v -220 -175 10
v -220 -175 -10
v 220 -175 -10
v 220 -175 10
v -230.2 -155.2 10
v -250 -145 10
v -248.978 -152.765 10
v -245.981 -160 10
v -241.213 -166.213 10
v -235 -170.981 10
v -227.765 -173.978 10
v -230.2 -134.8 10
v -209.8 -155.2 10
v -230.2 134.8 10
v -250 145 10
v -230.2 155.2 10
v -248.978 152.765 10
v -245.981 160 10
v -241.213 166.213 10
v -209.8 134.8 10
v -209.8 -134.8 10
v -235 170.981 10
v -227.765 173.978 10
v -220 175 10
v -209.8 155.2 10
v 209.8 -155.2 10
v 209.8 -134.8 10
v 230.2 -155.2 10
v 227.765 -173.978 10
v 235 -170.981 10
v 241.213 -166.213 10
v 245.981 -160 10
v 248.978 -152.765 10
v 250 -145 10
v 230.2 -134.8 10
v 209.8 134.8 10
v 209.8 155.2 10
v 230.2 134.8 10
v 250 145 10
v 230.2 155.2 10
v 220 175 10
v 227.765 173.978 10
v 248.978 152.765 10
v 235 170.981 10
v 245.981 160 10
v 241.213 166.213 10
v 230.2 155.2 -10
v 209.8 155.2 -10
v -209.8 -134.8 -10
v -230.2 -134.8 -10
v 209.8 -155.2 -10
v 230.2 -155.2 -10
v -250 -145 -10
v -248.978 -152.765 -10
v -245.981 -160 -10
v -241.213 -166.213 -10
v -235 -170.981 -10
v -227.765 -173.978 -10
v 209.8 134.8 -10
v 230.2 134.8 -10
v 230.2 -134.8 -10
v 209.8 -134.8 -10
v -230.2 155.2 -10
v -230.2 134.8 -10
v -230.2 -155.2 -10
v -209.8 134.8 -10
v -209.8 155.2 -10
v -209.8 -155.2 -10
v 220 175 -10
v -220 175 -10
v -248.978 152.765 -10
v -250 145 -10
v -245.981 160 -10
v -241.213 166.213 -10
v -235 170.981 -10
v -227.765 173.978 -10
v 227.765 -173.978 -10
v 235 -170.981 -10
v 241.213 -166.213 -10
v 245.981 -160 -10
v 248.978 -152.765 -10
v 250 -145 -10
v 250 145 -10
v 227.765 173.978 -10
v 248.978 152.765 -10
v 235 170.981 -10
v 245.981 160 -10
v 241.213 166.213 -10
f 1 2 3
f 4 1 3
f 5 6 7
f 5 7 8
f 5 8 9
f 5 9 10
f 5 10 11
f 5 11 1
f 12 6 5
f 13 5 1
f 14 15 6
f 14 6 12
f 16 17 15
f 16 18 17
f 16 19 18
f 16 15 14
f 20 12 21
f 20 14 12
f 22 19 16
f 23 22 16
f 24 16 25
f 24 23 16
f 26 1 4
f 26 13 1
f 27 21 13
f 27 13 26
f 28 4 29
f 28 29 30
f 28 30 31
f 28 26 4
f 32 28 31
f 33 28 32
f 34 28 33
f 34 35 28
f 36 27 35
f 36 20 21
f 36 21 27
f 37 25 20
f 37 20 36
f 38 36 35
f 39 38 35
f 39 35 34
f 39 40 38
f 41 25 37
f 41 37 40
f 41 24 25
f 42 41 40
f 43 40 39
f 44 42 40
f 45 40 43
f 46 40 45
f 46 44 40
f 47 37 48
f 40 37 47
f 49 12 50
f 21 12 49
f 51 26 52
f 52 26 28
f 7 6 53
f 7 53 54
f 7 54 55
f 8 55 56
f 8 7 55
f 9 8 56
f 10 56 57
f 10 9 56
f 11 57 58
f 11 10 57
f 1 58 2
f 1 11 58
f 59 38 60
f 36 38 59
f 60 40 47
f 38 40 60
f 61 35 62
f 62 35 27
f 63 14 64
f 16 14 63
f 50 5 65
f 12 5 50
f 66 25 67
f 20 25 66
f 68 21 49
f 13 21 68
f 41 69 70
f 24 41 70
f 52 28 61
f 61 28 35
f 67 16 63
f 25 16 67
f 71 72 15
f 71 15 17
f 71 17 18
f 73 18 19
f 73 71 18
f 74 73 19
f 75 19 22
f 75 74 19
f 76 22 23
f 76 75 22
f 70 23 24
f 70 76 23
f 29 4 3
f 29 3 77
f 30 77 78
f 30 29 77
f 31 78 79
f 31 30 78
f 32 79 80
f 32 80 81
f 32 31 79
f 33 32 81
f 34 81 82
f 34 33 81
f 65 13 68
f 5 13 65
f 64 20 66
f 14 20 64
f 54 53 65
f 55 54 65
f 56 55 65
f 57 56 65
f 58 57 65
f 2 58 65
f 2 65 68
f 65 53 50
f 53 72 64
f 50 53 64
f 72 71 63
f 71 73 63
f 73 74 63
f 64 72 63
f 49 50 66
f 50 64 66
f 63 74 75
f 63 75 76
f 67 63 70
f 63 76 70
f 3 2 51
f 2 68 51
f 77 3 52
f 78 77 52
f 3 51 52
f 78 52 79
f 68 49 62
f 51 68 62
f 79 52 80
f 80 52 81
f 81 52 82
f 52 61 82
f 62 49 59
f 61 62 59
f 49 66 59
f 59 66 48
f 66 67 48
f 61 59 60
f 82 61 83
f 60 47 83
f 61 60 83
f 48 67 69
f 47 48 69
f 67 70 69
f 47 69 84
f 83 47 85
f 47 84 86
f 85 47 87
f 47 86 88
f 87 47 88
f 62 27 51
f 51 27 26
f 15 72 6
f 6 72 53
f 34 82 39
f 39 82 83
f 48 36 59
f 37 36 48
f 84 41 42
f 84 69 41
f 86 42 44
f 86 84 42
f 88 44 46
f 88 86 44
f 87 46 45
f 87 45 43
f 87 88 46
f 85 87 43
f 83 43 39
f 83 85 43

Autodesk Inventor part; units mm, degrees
sketch "Esboço1" plane through (0, 0, 0) normal (0, 0, 1) x (1, 0, 0)
  line L0 (-250, -175) -> (250, -175)
  line L1 (250, -175) -> (250, 175)
  line L2 (250, 175) -> (-250, 175)
  line L3 (-250, 175) -> (-250, -175)
  line L4 (-250, -175) -> (250, 175) construction
  line L5 (250, -175) -> (-250, 175) construction
  point P0 (0, 0)
  dimension "d0" = 500
  dimension "d1" = 350
extrude "Extrusão1" add sketch "Esboço1" along normal mid plane 20
fillet "Arredondamento1" radius 30 4 edges at (-250, 175, 0) (250, 175, 0) (250, -175, 0) (-250, -175, 0)
sketch "Esboço2" plane through (0, 0, 10) normal (0, 0, 1) x (1, 0, 0)
  line L0 (230, 135) -> (230, 155) projected
  line L1 (230, 155) -> (210, 155) projected
  line L2 (210, 155) -> (210, 135) projected
  line L3 (210, 135) -> (230, 135) projected
  line L4 (212, 137) -> (212, 153) projected
  line L5 (212, 153) -> (228, 153) projected
  line L6 (228, 153) -> (228, 137) projected
  line L7 (228, 137) -> (212, 137) projected
  line L8 (209.8, 155.2) -> (230.2, 155.2)
  line L9 (230.2, 155.2) -> (230.2, 134.8)
  line L10 (230.2, 134.8) -> (209.8, 134.8)
  line L11 (209.8, 134.8) -> (209.8, 155.2)
  line L12 (-210, 135) -> (-210, 155) projected
  line L13 (-210, 155) -> (-230, 155) projected
  line L14 (-230, 155) -> (-230, 135) projected
  line L15 (-230, 135) -> (-210, 135) projected
  line L16 (-228, 137) -> (-228, 153) projected
  line L17 (-228, 153) -> (-212, 153) projected
  line L18 (-212, 153) -> (-212, 137) projected
  line L19 (-212, 137) -> (-228, 137) projected
  line L20 (-210, -155) -> (-210, -135) projected
  line L21 (-210, -135) -> (-230, -135) projected
  line L22 (-230, -135) -> (-230, -155) projected
  line L23 (-230, -155) -> (-210, -155) projected
  line L24 (-228, -153) -> (-228, -137) projected
  line L25 (-228, -137) -> (-212, -137) projected
  line L26 (-212, -137) -> (-212, -153) projected
  line L27 (-212, -153) -> (-228, -153) projected
  line L28 (230, -135) -> (230, -155) projected
  line L29 (230, -155) -> (210, -155) projected
  line L30 (210, -155) -> (210, -135) projected
  line L31 (210, -135) -> (230, -135) projected
  line L32 (212, -137) -> (212, -153) projected
  line L33 (212, -153) -> (228, -153) projected
  line L34 (228, -153) -> (228, -137) projected
  line L35 (228, -137) -> (212, -137) projected
  line L36 (-230.2, 155.2) -> (-209.8, 155.2)
  line L37 (-209.8, 155.2) -> (-209.8, 134.8)
  line L38 (-209.8, 134.8) -> (-230.2, 134.8)
  line L39 (-230.2, 134.8) -> (-230.2, 155.2)
  line L40 (-230.2, -134.8) -> (-209.8, -134.8)
  line L41 (-209.8, -134.8) -> (-209.8, -155.2)
  line L42 (-209.8, -155.2) -> (-230.2, -155.2)
  line L43 (-230.2, -155.2) -> (-230.2, -134.8)
  line L44 (230.2, -155.2) -> (230.2, -134.8)
  line L45 (230.2, -134.8) -> (209.8, -134.8)
  line L46 (209.8, -134.8) -> (209.8, -155.2)
  line L47 (209.8, -155.2) -> (230.2, -155.2)
  point P0 (0, 0)
  dimension "d5" = 0.2
  dimension "d6" = 0.2
  dimension "d7" = 0.2
  dimension "d8" = 0.2
extrude "Extrusão2" cut sketch "Esboço2" against normal blind 20 contours L3 L2 L1 L0 | L4 L5 L6 L7 | L8 L9 L10 L11 | L15 L14 L13 L12 | L16 L17 L18 L19 | L23 L22 L21 L20 | L24 L25 L26 L27 | L28 L29 L30 L31 | L35 L34 L33 L32 | L36 L37 L38 L39 | L40 L41 L42 L43 | L47 L46 L45 L44
properties part number "Sessao8_07_04_2025_0001_0001" material "Ouro"
